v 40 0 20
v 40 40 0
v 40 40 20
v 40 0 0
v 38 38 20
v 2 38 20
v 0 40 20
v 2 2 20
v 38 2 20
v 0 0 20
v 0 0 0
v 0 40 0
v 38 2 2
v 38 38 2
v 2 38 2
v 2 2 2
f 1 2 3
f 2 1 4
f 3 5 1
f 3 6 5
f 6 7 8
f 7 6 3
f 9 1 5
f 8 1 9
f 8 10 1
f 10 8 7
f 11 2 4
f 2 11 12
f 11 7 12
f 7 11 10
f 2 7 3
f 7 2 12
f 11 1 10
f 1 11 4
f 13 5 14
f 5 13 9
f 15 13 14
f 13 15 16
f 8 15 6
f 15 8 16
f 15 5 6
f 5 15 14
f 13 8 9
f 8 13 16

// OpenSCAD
// SPDX-License-Identifier: CC-BY-NC-SA-4.0
// body part — the box base.
module body() {
    difference() {
        cube([40, 40, 20]);
        translate([2, 2, 2]) cube([36, 36, 20]);
    }
}

body();
